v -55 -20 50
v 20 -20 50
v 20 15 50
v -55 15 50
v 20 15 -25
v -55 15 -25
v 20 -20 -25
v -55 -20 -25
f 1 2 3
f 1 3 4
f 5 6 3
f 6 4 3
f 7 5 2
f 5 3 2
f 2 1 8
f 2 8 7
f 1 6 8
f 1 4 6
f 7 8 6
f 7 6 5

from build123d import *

# Parameters (mm, degrees)
F1_DEPTH = 20
F2_DEPTH = 15
F3_W     = 75
F3_H     = 35
F4_DEPTH = 25


with BuildPart() as f1:
    # F0 (on Front) → F1 (new body)
    with BuildSketch(Plane.XZ):
        Polygon((-55, 0), (0, 0), (20, 0), (20, 50), (-55, 50), align=None)
    extrude(amount=F1_DEPTH)

    # F2 (add): a face of the model
    f2_faces = [f1.faces().sort_by_distance(p)[0] for p in [
        (-17.5, 0, 25),
    ]]
    extrude(f2_faces, amount=F2_DEPTH)

    # F3 (on face) → F4 (join)
    with BuildSketch(Plane(origin=(0, 0, 0), x_dir=(1, 0, 0), z_dir=(0, 0, -1))):
        with Locations((-17.5, 2.5)):
            Rectangle(F3_W, F3_H)
    extrude(amount=F4_DEPTH)


solid = f1.part
